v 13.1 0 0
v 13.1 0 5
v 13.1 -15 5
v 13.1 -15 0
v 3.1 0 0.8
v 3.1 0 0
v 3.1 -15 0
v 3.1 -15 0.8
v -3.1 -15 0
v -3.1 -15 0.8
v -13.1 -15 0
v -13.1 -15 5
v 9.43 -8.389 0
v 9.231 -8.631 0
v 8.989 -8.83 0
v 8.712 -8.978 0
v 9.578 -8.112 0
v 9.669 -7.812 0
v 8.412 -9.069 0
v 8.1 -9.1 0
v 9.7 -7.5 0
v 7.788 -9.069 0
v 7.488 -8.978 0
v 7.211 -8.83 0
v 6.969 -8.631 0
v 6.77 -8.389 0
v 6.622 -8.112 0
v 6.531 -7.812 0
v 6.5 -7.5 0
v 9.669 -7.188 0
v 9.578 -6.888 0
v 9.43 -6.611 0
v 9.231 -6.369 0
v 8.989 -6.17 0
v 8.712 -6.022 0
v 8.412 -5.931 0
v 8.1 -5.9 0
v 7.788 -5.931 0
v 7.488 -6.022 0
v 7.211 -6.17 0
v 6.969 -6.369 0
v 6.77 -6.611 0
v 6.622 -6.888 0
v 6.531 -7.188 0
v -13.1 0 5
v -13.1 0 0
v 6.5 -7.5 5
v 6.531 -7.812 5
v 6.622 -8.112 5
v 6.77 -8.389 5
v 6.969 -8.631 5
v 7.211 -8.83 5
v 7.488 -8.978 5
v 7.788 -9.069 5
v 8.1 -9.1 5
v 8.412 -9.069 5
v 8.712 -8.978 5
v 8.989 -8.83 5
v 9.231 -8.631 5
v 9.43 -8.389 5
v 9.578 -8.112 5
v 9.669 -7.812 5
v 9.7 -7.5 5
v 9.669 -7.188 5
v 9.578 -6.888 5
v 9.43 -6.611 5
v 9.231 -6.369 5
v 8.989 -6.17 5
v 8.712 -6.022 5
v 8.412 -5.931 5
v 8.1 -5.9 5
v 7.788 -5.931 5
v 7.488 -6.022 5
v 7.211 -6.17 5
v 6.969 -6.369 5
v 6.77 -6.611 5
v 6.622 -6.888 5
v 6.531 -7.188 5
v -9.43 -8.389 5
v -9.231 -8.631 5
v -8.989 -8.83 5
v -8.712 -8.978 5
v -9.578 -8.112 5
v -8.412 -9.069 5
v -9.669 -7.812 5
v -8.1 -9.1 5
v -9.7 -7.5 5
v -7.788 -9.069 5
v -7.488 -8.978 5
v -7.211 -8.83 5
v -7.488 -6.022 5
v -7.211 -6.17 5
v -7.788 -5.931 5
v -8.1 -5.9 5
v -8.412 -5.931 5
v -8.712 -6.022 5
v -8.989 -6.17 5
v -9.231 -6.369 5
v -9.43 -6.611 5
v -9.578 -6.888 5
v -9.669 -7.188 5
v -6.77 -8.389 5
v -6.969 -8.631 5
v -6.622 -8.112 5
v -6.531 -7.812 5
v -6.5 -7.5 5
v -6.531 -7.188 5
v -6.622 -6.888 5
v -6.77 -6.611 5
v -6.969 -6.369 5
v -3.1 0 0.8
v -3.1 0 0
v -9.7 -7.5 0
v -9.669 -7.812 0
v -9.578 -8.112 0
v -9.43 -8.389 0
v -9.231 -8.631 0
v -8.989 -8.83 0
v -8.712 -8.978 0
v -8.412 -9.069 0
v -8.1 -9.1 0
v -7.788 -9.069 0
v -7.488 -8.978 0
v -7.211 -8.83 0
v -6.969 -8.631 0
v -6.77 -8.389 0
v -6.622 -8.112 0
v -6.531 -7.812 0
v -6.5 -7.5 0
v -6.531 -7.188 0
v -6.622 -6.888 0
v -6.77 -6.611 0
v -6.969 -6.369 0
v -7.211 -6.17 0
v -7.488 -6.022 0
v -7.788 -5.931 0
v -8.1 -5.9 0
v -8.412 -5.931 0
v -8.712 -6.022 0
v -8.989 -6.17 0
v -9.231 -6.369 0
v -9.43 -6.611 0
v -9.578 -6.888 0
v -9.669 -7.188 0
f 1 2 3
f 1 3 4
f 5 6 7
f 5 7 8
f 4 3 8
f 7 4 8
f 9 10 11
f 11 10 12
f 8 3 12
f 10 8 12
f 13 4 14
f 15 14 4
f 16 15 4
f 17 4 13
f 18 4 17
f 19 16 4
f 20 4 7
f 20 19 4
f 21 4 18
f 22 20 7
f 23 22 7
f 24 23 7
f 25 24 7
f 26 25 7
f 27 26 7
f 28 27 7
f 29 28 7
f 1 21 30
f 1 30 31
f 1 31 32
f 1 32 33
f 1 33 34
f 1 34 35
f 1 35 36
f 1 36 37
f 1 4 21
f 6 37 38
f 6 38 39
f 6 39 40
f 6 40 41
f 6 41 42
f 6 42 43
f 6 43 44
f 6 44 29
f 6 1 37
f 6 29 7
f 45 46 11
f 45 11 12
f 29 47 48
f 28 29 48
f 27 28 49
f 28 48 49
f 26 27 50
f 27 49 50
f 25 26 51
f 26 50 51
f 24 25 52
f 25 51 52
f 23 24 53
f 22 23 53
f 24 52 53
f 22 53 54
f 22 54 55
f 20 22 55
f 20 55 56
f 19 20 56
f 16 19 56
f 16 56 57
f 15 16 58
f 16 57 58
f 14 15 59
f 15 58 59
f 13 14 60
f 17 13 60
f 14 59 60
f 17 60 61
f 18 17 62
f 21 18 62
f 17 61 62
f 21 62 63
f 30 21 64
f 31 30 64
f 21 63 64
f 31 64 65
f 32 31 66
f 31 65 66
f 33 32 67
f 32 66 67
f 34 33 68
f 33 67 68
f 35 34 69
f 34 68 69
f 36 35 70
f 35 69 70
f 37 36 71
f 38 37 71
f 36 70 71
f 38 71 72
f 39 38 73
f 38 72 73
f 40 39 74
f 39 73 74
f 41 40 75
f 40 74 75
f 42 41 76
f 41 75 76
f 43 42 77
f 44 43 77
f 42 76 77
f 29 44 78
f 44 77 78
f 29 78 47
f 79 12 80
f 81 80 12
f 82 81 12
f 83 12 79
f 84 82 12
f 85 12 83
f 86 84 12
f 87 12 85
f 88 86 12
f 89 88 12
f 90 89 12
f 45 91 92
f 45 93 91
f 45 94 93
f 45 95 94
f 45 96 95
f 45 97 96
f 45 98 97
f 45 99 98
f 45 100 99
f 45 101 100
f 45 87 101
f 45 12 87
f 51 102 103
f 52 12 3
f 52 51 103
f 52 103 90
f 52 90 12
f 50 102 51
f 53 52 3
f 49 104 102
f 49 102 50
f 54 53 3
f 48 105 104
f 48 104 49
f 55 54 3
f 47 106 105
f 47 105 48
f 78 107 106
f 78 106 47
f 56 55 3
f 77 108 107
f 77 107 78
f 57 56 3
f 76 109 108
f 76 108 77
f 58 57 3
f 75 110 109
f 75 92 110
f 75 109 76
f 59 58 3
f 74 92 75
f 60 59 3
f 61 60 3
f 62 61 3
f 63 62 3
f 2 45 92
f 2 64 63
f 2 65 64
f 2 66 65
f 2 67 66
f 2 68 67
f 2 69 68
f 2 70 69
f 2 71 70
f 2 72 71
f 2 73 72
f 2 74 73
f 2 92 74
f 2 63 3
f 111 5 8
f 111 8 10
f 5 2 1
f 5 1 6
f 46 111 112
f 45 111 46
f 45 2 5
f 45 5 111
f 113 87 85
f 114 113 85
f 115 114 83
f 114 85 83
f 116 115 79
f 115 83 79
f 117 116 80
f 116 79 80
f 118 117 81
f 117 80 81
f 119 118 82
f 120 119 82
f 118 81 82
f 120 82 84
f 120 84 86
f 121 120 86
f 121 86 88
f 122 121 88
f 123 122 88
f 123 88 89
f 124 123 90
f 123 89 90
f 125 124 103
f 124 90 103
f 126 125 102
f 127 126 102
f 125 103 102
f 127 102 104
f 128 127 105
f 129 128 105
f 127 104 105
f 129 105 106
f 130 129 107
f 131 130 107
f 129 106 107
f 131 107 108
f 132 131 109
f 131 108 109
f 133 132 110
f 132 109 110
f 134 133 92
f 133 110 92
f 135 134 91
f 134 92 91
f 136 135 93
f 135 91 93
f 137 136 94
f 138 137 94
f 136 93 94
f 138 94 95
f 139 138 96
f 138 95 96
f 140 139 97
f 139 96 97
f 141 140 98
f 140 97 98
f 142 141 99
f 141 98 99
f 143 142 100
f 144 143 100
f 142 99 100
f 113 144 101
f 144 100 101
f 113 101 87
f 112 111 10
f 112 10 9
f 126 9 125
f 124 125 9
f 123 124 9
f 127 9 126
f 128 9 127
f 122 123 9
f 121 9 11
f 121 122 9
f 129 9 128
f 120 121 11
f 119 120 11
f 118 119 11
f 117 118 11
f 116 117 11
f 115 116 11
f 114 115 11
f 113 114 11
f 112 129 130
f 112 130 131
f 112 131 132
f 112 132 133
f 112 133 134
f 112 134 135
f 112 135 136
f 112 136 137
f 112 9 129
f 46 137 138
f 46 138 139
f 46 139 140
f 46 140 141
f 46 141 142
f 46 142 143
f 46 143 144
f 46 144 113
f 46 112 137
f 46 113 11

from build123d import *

# Parameters (mm, degrees)
PAD_DEPTH    = 15
SKETCH001_R  = 1.6
POCKET_DEPTH = 5


with BuildPart() as part:
    # Sketch → Pad (new body)
    with BuildSketch(Plane.XZ):
        Polygon((-3.1, 0), (-13.1, 0), (-13.1, 5), (13.1, 5), (13.1, 0), (3.1, 0), (3.1, 0.8), (-3.1, 0.8), align=None)
    extrude(amount=PAD_DEPTH)

    # Sketch001 (on Face3 of Pad) → Pocket (cut)
    with BuildSketch(Plane(origin=(0, 0, 5), x_dir=(-1, 0, 0), z_dir=(0, 0, 1))):
        with Locations((-8.1, 7.5)):
            Circle(SKETCH001_R)
        with Locations((8.1, 7.5)):
            Circle(SKETCH001_R)
    extrude(amount=-POCKET_DEPTH, mode=Mode.SUBTRACT)


solid = part.part
